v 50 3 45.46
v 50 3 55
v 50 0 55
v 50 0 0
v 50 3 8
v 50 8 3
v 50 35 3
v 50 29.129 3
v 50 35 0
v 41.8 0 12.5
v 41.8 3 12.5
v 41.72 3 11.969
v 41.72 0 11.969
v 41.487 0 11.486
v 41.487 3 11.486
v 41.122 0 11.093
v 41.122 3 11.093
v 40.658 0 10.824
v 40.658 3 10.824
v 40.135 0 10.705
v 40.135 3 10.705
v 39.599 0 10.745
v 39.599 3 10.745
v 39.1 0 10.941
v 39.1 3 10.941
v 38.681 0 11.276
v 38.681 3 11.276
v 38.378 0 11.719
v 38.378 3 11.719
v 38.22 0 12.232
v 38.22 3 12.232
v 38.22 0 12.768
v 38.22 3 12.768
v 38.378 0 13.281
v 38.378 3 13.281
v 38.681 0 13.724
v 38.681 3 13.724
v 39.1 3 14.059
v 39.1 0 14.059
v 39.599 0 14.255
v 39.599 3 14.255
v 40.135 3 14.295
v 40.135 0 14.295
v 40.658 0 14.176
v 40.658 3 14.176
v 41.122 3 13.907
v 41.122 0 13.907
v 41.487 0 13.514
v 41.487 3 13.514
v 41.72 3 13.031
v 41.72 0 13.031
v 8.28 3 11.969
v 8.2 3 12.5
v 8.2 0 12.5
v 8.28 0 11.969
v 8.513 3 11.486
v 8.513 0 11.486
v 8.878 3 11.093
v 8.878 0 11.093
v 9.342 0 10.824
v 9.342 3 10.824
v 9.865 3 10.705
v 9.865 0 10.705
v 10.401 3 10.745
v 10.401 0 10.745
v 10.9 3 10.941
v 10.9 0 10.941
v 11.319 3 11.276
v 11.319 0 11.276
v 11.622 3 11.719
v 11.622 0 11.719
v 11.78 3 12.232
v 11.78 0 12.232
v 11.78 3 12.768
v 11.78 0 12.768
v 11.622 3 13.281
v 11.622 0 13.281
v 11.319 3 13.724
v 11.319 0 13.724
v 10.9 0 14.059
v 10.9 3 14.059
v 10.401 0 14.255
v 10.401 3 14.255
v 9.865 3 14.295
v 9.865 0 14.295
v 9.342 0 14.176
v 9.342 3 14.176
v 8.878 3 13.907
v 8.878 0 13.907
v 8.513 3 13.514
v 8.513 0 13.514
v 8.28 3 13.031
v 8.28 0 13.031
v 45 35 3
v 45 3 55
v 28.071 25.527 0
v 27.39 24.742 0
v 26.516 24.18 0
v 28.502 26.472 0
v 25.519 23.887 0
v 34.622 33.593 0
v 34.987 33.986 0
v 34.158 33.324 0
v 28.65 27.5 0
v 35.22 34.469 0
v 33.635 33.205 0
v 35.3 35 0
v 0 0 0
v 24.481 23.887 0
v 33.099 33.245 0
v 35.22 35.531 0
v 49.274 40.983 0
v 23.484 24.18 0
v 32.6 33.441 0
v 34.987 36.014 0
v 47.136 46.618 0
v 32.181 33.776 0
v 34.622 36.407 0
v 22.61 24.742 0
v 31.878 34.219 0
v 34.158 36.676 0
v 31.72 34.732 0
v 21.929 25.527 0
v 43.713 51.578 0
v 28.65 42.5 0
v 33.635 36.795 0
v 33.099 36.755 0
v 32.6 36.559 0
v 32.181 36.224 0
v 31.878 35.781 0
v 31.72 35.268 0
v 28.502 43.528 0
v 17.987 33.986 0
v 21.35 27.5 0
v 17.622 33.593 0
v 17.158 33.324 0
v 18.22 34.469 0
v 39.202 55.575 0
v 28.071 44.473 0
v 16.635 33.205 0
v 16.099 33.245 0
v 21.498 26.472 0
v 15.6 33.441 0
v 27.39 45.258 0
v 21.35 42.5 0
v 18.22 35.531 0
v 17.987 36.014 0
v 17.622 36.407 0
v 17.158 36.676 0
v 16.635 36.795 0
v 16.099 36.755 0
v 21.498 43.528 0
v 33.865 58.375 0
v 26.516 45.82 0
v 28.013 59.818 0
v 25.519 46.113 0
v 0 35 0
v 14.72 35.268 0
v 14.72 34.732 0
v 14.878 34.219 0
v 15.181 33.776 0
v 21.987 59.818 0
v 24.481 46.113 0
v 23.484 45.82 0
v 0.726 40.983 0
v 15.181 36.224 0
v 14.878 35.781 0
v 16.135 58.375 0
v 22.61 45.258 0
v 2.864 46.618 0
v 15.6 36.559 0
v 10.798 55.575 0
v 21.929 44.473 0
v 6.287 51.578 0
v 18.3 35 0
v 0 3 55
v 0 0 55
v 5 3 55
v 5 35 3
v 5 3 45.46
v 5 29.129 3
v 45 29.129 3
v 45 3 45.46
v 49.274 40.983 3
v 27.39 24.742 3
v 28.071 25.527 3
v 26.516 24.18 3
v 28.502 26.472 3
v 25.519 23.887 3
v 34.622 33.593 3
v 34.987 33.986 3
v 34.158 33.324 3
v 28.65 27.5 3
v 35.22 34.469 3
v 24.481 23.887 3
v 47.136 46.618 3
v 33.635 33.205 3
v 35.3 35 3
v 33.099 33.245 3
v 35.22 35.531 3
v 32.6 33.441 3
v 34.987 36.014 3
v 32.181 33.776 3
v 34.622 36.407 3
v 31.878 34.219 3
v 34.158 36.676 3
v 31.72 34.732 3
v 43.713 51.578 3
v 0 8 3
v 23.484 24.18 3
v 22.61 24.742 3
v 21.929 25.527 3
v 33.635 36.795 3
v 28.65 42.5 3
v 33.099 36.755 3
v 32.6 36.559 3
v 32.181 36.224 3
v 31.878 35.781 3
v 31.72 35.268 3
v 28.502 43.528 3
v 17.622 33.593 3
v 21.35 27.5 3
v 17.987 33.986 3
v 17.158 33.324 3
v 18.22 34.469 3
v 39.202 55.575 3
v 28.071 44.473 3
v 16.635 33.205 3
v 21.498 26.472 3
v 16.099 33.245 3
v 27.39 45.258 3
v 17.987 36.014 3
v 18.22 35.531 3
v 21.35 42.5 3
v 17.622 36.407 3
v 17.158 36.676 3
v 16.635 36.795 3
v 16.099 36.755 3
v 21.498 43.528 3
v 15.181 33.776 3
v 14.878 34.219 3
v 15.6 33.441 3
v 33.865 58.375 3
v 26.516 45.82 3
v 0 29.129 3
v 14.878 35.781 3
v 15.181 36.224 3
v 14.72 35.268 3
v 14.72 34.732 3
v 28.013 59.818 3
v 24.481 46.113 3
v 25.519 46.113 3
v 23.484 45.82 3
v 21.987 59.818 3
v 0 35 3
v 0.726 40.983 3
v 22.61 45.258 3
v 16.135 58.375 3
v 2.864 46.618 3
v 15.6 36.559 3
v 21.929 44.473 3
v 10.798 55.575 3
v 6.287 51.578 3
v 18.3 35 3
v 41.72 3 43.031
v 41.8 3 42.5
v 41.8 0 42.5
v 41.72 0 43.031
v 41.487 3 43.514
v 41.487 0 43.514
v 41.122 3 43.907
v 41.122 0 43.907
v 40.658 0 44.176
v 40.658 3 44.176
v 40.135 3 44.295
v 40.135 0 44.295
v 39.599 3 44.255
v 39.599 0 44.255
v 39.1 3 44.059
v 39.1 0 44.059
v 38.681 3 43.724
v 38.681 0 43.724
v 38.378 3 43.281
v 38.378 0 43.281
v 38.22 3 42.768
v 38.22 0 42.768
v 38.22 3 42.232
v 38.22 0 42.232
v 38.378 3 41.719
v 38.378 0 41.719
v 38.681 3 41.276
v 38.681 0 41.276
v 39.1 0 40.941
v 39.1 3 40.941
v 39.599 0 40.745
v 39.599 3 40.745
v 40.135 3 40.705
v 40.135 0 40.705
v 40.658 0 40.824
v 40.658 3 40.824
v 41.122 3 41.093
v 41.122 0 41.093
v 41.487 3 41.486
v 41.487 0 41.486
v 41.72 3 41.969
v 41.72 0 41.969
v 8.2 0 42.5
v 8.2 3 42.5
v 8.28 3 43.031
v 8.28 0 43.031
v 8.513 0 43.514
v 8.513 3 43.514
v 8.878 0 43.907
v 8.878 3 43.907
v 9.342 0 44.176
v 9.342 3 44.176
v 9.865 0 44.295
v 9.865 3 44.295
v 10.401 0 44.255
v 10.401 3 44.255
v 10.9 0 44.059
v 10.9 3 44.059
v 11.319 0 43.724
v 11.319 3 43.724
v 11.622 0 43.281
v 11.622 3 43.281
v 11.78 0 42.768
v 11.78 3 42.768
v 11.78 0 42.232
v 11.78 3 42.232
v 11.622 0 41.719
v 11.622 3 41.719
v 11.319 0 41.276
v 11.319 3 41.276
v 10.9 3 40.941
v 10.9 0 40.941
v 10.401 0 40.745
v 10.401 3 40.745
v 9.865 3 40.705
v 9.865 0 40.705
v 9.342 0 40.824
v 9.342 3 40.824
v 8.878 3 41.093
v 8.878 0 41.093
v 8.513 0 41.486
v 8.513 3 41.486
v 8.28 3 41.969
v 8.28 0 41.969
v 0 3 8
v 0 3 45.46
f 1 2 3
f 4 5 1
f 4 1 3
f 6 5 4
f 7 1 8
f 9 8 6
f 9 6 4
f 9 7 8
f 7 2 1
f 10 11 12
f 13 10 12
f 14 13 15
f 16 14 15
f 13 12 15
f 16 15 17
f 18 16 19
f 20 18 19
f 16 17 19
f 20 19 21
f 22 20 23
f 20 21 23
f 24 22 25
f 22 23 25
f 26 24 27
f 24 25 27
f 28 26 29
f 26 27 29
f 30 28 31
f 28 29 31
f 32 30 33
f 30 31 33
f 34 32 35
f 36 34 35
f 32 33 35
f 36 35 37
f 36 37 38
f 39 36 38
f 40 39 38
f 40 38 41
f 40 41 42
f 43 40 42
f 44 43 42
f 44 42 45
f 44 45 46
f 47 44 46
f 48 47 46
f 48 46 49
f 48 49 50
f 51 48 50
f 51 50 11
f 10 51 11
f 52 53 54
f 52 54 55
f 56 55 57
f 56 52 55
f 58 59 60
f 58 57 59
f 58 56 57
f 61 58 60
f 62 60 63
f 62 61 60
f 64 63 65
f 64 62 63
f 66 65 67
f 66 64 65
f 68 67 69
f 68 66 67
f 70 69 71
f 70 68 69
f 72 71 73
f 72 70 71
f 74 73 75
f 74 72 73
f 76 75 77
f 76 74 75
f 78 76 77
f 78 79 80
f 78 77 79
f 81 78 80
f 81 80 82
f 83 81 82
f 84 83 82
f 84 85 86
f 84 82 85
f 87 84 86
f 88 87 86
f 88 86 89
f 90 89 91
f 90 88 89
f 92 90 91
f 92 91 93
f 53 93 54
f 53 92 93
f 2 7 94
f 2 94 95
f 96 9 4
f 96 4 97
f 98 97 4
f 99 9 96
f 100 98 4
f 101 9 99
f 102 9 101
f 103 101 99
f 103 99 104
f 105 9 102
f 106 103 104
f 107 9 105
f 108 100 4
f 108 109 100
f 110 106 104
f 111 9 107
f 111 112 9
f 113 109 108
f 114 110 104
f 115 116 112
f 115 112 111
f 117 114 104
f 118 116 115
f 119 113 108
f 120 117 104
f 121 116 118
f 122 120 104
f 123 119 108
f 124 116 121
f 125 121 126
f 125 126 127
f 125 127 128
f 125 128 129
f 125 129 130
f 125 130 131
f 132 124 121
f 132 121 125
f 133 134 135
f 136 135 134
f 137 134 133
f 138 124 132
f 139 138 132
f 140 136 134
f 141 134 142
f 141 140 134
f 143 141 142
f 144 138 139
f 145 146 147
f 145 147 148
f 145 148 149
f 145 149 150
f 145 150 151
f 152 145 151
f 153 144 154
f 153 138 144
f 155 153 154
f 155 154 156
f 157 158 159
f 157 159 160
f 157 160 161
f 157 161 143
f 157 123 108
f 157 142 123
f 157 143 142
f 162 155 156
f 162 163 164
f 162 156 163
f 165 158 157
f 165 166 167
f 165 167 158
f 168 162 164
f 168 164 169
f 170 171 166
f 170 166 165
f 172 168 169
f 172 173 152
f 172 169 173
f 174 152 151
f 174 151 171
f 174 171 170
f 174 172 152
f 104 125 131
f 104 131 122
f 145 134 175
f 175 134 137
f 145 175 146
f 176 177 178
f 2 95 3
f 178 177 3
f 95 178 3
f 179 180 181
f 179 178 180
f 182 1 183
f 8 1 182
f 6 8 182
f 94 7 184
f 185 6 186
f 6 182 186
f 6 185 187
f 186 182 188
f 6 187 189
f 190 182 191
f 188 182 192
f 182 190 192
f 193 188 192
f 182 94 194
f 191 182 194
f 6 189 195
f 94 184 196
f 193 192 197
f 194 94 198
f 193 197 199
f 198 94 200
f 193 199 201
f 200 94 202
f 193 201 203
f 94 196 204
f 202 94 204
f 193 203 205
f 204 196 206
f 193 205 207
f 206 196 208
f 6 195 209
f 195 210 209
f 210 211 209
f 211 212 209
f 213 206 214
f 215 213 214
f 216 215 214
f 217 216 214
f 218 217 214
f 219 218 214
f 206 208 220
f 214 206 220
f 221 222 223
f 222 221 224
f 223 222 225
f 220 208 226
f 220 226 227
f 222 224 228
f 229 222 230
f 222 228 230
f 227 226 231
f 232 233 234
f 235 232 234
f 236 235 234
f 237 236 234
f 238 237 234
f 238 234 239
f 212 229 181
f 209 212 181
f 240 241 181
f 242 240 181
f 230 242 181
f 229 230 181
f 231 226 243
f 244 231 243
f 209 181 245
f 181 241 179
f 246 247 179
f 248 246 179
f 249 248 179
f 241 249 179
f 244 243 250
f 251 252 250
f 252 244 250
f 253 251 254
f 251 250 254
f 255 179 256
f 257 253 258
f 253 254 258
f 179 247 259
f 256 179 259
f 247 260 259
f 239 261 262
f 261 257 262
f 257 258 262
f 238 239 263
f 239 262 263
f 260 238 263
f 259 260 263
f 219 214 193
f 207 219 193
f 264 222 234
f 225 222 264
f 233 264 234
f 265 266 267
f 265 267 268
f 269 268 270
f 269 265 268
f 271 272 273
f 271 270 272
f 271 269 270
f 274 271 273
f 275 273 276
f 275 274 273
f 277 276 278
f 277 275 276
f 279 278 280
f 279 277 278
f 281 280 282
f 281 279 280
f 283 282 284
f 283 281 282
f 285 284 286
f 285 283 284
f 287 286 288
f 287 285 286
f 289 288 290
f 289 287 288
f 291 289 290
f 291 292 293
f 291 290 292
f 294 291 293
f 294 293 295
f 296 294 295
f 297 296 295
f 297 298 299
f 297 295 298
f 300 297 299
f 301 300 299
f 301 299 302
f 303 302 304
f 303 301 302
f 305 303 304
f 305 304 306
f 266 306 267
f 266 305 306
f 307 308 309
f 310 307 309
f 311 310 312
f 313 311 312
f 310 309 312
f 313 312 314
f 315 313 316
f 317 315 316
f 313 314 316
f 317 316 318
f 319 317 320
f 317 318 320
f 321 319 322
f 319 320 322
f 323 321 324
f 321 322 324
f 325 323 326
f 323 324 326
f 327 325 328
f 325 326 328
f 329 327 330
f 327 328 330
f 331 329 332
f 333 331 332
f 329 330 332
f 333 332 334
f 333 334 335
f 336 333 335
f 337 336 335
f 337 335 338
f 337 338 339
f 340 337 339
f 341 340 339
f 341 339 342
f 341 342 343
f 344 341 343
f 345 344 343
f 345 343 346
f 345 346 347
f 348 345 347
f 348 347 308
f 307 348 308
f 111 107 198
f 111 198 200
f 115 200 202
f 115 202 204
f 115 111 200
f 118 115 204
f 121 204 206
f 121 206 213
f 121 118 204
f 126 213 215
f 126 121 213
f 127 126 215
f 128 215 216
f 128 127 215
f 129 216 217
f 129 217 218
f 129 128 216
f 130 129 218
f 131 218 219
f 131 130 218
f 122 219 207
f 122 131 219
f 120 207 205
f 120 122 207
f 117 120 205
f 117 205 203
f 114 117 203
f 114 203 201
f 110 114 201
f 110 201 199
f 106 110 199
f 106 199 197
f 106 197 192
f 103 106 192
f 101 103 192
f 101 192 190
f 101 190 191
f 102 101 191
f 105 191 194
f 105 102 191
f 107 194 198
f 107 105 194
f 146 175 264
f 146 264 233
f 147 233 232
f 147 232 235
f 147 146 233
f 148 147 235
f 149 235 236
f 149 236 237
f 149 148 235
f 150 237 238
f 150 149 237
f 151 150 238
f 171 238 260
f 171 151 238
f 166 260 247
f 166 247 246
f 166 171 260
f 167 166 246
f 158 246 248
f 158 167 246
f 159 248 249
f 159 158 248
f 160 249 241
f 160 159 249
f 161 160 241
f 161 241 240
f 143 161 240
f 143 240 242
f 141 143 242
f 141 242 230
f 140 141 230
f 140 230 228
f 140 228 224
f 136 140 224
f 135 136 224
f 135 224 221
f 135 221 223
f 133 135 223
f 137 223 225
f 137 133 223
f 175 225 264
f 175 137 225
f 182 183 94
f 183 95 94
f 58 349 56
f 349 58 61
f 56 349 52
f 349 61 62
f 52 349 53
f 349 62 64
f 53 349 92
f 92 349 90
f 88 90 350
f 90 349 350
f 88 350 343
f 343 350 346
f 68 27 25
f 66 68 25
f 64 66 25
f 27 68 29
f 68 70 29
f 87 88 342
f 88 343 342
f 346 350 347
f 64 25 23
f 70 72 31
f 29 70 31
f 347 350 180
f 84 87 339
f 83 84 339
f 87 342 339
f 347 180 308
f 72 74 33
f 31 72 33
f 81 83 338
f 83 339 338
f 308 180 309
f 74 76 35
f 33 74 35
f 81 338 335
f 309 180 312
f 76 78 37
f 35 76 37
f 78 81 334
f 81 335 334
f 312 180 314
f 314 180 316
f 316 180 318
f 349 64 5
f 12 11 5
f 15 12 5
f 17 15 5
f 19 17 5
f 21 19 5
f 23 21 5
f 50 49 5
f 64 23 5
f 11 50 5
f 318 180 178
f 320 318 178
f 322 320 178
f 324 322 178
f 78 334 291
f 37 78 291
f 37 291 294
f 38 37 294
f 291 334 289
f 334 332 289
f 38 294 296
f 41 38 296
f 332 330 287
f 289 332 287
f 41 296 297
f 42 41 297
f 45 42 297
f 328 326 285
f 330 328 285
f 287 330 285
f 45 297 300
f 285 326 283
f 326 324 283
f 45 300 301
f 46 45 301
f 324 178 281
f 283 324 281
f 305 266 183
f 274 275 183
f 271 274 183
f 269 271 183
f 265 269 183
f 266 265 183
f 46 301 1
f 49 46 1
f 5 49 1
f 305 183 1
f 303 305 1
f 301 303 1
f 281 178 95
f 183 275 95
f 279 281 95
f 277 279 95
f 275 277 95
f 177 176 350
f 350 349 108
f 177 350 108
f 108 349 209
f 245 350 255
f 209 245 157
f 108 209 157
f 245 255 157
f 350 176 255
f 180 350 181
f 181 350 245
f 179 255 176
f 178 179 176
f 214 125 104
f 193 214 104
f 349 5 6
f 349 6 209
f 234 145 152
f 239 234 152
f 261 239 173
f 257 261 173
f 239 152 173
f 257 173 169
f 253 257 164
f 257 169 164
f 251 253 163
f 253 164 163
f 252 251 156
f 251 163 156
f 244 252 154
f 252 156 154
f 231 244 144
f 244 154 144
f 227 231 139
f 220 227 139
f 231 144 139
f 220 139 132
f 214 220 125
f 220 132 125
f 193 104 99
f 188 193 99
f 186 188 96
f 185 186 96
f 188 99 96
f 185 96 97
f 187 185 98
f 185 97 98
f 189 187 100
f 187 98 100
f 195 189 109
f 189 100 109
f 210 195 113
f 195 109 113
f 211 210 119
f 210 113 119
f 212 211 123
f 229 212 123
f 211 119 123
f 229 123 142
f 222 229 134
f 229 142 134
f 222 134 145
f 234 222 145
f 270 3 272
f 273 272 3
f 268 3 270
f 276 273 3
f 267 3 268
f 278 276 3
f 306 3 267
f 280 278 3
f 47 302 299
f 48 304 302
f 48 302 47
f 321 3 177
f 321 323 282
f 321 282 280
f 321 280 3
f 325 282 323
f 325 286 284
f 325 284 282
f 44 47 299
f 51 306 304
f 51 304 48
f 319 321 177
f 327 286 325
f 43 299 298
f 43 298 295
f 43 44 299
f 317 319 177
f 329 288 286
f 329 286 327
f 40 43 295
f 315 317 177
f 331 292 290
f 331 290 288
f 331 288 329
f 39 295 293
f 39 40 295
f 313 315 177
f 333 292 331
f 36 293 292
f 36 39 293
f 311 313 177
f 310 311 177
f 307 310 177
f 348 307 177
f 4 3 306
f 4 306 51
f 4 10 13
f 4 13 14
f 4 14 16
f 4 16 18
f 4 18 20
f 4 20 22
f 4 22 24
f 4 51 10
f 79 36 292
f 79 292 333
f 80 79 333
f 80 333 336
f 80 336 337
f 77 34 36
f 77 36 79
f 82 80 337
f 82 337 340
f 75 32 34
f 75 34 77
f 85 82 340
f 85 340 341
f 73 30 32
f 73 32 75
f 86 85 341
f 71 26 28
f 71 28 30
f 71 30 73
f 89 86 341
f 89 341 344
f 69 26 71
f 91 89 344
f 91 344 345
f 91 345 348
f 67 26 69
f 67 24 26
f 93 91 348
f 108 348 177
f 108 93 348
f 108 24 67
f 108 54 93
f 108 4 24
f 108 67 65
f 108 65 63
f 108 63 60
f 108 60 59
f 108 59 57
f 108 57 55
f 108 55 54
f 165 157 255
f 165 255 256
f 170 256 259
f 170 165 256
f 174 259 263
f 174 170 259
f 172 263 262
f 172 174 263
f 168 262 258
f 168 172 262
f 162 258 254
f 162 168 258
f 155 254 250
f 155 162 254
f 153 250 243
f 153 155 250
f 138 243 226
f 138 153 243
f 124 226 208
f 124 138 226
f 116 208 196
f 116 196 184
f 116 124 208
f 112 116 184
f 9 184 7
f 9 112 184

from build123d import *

# Parameters (mm, degrees)
SKETCH5_R                            = 1.8
BOSS_EXTRUDE2_DEPTH                  = 3
SKETCH6_W                            = 50
SKETCH6_H                            = 55
BOSS_EXTRUDE3_DEPTH                  = 3
M3_3_6MM_D                           = 3.6
MIRROR1_AT_THE_SECOND_PLANE_COPY_1_D = 3.6
BOSS_EXTRUDE4_DEPTH                  = 5
CHAMFER1_SIZE                        = 5


with BuildPart() as part:
    # Sketch5 → Boss-Extrude2 (new body)
    with BuildSketch(Plane.XY):
        with BuildLine():
            Line((0, 0), (0, 35))
            ThreePointArc((0, 35), (25, 60), (50, 35))
            Line((50, 35), (50, 0))
            Line((50, 0), (0, 0))
        make_face()
        with Locations((16.5, 35)):
            Circle(SKETCH5_R, mode=Mode.SUBTRACT)
        with Locations((33.5, 35)):
            Circle(SKETCH5_R, mode=Mode.SUBTRACT)
        with BuildLine():
            Line((28.65, 42.5), (28.65, 27.5))
            ThreePointArc((28.65, 27.5), (25, 23.85), (21.35, 27.5))
            Line((21.35, 27.5), (21.35, 42.5))
            ThreePointArc((21.35, 42.5), (25, 46.15), (28.65, 42.5))
        make_face(mode=Mode.SUBTRACT)
    extrude(amount=BOSS_EXTRUDE2_DEPTH)

    # Sketch6 → Boss-Extrude3 (add)
    with BuildSketch(Plane.XZ):
        with Locations((25, 27.5)):
            Rectangle(SKETCH6_W, SKETCH6_H)
    extrude(amount=-BOSS_EXTRUDE3_DEPTH)

    # M3, 3.6mm (through all)
    with Locations(Plane.XZ):
        with Locations((10, 42.5)):
            m3_3_6mm = Hole(M3_3_6MM_D / 2)

    # Mirror1: M3, 3.6mm across plane
    add(m3_3_6mm.mirror(Plane.ZY.offset(-25)), mode=Mode.SUBTRACT)

    # Mirror1 at the second plane: M3, 3.6mm across plane
    add(m3_3_6mm.mirror(Plane.XY.offset(27.5)), mode=Mode.SUBTRACT)

    # Mirror1 at the second plane copy 1 (through all)
    with Locations(Plane(origin=(50, 0, 55), x_dir=(-1, 0, 0), z_dir=(0, -1, 0))):
        with Locations((10, 42.5)):
            Hole(MIRROR1_AT_THE_SECOND_PLANE_COPY_1_D / 2)

    # Sketch10 → Boss-Extrude4 (add)
    with BuildSketch(Plane(origin=(50, 0, 0), x_dir=(0, 0, -1), z_dir=(1, 0, 0))):
        Polygon((-3, 35), (-55, 3), (-45.459789048, 3), (-3, 29.129100953), align=None)
    boss_extrude4 = extrude(amount=-BOSS_EXTRUDE4_DEPTH)

    # Mirror2: Boss-Extrude4 across plane
    add(boss_extrude4.mirror(Plane.ZY.offset(-25)))

    # Chamfer1
    chamfer1_edges = [part.edges().sort_by_distance(p)[0] for p in [
        (25, 3, 3),
    ]]
    chamfer(chamfer1_edges, length=CHAMFER1_SIZE)


solid = part.part
